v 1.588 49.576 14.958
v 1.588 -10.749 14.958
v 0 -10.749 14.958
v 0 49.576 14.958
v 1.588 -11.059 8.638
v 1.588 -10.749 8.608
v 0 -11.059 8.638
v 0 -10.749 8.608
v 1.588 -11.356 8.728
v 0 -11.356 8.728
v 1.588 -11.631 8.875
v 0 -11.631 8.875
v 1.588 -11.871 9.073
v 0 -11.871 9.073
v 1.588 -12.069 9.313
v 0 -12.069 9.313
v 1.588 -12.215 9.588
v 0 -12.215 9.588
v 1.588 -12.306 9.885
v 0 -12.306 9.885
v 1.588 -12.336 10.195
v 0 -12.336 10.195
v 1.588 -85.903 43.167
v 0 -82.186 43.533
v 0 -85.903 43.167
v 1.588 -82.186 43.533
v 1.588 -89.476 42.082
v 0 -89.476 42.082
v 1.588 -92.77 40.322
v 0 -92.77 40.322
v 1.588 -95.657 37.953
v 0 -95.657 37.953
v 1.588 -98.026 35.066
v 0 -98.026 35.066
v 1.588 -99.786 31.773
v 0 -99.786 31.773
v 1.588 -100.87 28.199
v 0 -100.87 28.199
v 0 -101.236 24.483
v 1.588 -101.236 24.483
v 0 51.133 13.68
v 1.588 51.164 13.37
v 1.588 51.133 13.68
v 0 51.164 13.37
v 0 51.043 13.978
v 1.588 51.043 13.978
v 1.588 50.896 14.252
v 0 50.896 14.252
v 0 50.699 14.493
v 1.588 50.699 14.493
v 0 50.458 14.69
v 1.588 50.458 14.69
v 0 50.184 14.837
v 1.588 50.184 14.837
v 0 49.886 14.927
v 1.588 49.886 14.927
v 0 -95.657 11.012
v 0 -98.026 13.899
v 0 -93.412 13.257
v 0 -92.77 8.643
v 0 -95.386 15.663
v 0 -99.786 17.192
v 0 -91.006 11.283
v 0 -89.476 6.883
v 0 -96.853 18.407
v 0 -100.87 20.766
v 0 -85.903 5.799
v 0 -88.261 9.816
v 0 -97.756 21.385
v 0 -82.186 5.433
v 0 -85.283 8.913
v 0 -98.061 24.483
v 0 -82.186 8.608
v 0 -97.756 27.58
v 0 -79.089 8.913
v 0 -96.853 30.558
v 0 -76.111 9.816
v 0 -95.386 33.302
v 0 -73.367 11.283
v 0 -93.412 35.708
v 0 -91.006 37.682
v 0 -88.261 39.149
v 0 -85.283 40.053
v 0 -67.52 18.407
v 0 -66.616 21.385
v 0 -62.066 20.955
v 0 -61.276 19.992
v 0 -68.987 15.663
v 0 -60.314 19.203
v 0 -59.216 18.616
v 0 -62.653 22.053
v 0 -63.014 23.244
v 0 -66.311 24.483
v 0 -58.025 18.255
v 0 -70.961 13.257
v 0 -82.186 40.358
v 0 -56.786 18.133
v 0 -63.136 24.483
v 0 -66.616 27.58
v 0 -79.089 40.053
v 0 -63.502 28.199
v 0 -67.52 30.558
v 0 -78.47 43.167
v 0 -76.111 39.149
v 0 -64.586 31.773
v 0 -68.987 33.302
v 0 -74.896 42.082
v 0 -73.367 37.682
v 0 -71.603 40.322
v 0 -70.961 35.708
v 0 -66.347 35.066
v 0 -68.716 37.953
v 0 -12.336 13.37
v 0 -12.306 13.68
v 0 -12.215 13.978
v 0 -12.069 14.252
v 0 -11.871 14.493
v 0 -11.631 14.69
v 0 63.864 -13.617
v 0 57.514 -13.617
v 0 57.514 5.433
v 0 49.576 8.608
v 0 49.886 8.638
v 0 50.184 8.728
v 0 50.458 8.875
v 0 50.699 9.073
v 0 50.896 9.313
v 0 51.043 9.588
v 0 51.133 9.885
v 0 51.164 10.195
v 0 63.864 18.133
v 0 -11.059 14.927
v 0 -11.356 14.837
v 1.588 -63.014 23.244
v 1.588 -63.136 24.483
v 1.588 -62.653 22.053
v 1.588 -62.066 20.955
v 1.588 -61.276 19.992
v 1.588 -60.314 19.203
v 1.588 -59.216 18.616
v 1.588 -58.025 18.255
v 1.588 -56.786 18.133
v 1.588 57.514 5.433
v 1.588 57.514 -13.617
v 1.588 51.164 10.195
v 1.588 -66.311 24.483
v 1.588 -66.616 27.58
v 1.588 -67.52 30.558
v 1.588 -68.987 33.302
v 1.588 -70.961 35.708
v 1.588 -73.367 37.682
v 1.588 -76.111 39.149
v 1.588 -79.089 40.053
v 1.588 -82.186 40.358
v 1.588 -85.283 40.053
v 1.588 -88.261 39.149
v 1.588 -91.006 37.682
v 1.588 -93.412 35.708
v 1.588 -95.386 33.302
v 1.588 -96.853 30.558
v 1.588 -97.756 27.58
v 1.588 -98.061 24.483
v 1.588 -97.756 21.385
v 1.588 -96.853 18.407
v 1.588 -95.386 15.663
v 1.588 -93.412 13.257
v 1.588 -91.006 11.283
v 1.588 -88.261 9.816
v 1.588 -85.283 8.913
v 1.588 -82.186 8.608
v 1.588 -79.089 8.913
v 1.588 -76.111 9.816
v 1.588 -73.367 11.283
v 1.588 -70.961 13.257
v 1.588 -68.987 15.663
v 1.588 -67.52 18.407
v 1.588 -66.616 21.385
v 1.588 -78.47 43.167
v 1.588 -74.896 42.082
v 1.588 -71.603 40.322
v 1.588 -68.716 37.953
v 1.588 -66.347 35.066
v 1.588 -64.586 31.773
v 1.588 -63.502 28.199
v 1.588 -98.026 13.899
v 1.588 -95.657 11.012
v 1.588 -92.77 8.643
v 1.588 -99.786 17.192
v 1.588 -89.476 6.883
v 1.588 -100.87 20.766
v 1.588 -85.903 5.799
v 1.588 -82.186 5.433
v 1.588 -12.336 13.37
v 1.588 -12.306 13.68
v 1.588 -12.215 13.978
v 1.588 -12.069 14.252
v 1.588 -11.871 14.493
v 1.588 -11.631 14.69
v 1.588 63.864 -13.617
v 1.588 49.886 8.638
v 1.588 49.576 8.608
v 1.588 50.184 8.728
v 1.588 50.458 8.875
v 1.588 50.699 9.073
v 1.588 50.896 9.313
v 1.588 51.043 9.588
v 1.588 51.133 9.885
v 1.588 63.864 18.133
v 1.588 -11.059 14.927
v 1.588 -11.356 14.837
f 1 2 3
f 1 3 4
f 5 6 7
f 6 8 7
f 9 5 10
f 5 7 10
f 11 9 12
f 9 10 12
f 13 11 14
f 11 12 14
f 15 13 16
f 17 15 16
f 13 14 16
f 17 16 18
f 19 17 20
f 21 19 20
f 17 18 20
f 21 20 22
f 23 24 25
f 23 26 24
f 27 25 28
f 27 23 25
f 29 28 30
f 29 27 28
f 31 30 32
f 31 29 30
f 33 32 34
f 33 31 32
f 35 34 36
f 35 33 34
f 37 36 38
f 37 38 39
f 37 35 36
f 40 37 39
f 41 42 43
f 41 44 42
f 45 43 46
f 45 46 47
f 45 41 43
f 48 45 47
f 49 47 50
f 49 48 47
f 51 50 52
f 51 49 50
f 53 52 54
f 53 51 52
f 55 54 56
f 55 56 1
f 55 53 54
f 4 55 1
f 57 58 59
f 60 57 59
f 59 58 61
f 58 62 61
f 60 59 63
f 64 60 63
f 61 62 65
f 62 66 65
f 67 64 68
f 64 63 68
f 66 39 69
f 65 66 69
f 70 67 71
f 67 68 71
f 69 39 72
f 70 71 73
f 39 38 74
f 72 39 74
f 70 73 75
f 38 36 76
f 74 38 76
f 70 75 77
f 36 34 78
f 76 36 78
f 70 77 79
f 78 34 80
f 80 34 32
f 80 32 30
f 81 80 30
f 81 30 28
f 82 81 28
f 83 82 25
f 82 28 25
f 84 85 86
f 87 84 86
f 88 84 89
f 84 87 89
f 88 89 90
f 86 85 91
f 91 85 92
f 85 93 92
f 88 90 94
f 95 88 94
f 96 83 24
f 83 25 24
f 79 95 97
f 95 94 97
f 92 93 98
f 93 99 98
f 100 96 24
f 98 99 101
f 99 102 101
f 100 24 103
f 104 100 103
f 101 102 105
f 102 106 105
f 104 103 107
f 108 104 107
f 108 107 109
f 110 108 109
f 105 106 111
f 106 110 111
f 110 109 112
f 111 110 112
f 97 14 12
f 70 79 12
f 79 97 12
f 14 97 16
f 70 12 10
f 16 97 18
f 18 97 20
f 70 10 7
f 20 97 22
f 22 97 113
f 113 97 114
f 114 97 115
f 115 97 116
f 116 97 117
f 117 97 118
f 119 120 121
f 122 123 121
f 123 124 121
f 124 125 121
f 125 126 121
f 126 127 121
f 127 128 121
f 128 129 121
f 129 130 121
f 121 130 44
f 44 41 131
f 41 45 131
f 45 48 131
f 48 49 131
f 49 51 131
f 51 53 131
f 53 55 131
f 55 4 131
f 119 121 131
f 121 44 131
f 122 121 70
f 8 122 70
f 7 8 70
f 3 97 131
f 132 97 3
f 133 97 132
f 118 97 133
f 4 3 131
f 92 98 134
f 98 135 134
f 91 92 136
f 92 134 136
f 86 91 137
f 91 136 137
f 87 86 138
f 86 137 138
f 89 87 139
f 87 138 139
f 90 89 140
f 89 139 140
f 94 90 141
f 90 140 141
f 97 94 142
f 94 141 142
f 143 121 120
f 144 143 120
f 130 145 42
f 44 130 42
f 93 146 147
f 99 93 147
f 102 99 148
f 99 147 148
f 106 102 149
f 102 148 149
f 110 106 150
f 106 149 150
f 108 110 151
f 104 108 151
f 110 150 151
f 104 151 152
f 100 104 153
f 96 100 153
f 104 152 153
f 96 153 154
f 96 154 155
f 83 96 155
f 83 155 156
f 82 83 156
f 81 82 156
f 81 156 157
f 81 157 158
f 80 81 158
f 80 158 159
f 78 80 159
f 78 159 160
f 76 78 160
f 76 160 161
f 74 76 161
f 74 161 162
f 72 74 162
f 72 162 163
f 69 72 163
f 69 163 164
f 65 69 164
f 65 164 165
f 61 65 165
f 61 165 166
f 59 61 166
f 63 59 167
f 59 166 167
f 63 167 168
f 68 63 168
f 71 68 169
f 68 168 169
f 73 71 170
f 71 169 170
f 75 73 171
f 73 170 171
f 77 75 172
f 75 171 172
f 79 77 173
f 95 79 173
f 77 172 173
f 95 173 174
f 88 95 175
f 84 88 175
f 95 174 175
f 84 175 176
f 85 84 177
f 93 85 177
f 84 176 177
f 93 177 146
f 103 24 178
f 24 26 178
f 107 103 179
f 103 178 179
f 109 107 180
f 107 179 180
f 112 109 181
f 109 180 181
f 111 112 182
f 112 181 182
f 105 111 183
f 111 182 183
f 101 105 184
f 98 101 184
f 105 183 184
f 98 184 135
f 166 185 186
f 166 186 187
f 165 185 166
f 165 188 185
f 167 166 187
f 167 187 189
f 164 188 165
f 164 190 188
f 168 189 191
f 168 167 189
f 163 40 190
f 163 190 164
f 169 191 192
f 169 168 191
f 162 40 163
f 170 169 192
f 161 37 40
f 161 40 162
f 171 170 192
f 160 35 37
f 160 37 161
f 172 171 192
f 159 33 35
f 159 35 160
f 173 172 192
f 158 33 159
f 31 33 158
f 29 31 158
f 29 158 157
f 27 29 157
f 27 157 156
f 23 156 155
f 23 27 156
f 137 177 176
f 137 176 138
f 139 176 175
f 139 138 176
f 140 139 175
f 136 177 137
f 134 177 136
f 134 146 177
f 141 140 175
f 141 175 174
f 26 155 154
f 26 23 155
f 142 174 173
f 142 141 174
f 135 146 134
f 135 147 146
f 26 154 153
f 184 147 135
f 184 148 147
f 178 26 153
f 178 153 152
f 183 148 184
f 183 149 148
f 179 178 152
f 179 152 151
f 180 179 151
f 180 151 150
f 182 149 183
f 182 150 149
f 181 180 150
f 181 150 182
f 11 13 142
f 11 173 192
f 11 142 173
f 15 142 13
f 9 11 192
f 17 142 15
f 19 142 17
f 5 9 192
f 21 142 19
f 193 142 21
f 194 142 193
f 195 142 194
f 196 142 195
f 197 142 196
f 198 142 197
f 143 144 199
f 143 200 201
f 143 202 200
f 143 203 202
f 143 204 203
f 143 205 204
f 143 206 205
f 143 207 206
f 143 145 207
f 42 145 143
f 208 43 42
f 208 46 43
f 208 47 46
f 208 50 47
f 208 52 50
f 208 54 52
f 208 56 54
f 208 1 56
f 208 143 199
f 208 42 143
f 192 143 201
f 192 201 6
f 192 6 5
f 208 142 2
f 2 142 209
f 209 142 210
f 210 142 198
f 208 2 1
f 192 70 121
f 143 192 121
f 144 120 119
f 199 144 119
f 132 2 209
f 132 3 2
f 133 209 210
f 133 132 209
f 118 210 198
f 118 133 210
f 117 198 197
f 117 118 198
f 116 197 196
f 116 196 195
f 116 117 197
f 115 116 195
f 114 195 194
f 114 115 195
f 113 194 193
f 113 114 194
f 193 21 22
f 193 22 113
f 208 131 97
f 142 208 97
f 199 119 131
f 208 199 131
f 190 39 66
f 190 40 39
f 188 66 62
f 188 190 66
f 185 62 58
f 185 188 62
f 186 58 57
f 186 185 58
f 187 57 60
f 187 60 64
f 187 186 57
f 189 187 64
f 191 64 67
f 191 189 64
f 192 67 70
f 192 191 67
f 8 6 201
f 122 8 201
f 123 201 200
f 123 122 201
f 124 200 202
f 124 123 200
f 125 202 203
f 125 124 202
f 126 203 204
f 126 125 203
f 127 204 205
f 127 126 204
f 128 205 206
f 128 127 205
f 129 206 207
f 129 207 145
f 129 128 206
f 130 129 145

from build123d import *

# Parameters (mm, degrees)
F1_DEPTH = 1.5875
F2_R     = 19.04999
F3_R     = 6.35
F4_R     = 15.875
F5_DEPTH = 25.4
F6_W     = 63.5
F6_H     = 6.35
F7_DEPTH = 25.4
F8_R     = 1.5875


# Not quite as in the source:
# - a fillet or chamfer is up to 0.001 mm smaller than in the source, because OpenCascade refuses the exact size


with BuildPart() as f1:
    # F0 (on Right) → F1 (new body)
    with BuildSketch(Plane.YZ):
        Polygon((-63.1363113923, 43.5325428513), (-101.2363113923, 43.5325428513), (-101.2363113923, 5.4325428513), (57.5136886077, 5.4325428513), (57.5136886077, -13.6174602094), (63.8636886077, -13.6174602094), (63.8636886077, 18.1325428513), (-63.1363113923, 18.1325428513), align=None)
    extrude(amount=F1_DEPTH)

    # F2 (radius 19.05 in the source; OpenCascade refuses exactly that, so slightly less here)
    f2_edges = [f1.edges().sort_by_distance(p)[0] for p in [
        (0.79375, -63.136311, 43.532543),
        (0.79375, -101.236311, 43.532543),
        (0.79375, -101.236311, 5.432543),
    ]]
    fillet(f2_edges, radius=F2_R)

    # F3
    f3_edges = [f1.edges().sort_by_distance(p)[0] for p in [
        (0.79375, -63.136311, 18.132543),
    ]]
    fillet(f3_edges, radius=F3_R)

    # F4 (on face) → F5 (cut)
    with BuildSketch(Plane.YZ.offset(1.5875)):
        with Locations((-82.1863113923, 24.4825428513)):
            Circle(F4_R)
    extrude(amount=-F5_DEPTH, mode=Mode.SUBTRACT)

    # F6 (on face) → F7 (cut)
    with BuildSketch(Plane.YZ.offset(1.5875)):
        with Locations((19.4136886077, 11.7825428513)):
            Rectangle(F6_W, F6_H)
    extrude(amount=-F7_DEPTH, mode=Mode.SUBTRACT)

    # F8
    f8_edges = [f1.edges().sort_by_distance(p)[0] for p in [
        (0.79375, -12.336311, 14.957543),
        (0.79375, -12.336311, 8.607543),
        (0.79375, 51.163689, 8.607543),
        (0.79375, 51.163689, 14.957543),
    ]]
    fillet(f8_edges, radius=F8_R)


solid = f1.part
